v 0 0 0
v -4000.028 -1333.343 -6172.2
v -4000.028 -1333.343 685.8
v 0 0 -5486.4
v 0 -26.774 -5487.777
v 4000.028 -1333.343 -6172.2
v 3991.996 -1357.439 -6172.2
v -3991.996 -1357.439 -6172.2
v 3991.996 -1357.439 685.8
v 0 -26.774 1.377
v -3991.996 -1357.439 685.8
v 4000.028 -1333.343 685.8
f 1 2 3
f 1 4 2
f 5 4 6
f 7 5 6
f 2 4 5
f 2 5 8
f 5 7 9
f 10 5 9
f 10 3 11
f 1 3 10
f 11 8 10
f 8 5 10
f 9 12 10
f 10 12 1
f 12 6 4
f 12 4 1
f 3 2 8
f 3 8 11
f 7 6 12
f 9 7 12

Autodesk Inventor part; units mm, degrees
ref_plane "YZ Plane" through (0, 0, 0) normal (1, 0, 0) x (0, 1, 0)
ref_plane "Work Plane3" through (0, 0, 0) normal (-0.3162278, 0.9486833, 0) x (0, 0, 1)
sketch "Sketch5" plane through (0, 0, 0) normal (-0.3162278, 0.9486833, 0) x (0, 0, 1)
  line L0 (0, 0) -> (-5486.4, 0)
  line L1 (-5486.4, 0) -> (-6172.2, -4216.4)
  line L2 (-6172.2, -4216.4) -> (685.8, -4216.4)
  line L3 (685.8, -4216.4) -> (0, 0)
  line L4 (-7543.8, 0) -> (2057.4, 0) projected
  dimension "d14" = 5486.4
  dimension "d15" = 4216.4
  dimension "d18" = 6858
ref_plane "Work Plane4" through (0, 0, 0) normal (0.3162278, 0.9486833, 0) x (0, 0, 1)
sketch "Sketch6" plane through (0, 0, 0) normal (0.3162278, 0.9486833, 0) x (0, 0, 1)
  line L0 (0, 0) -> (-5486.4, 0)
  line L1 (-5486.4, 0) -> (-6172.2, 4216.4)
  line L2 (-6172.2, 4216.4) -> (685.8, 4216.4)
  line L3 (685.8, 4216.4) -> (0, 0)
  dimension "d20" = 5486.4
  dimension "d21" = 6858
  dimension "d22" = 4216.4
extrude "Extrusion3" add sketch "Sketch5" against normal blind 25.4
extrude "Extrusion4" add sketch "Sketch6" against normal blind 25.4
equation "\"d14\" = dormerRidgeLineLength"
equation "\"d15\" = dormerRidgeToGarageEave"
equation "\"d18\" = dormerGarageEaveLength"
equation "\"d20\" = dormerRidgeLineLength"
equation "\"d21\" = dormerPoolEaveLength"
equation "\"d22\" = dormerRidgeToPoolEave"
equation "\"pitch_6_12\" = 26.565deg"
equation "\"d11\" = pitch_4_12"
equation "\"pitch_4_12\" = 18.434949deg"
equation "\"dormerRidgeLineLength\" = 5486.4"
equation "\"dormerPoolEaveLength\" = 6858"
equation "\"dormerGarageEaveLength\" = 6858"
equation "\"dormerRidgeToGarageEave\" = 4216.4"
equation "\"d19\" = -pitch_4_12"
equation "\"dormerRidgeToPoolEave\" = 4216.4"
properties part number "houseDormerRoofV2"
